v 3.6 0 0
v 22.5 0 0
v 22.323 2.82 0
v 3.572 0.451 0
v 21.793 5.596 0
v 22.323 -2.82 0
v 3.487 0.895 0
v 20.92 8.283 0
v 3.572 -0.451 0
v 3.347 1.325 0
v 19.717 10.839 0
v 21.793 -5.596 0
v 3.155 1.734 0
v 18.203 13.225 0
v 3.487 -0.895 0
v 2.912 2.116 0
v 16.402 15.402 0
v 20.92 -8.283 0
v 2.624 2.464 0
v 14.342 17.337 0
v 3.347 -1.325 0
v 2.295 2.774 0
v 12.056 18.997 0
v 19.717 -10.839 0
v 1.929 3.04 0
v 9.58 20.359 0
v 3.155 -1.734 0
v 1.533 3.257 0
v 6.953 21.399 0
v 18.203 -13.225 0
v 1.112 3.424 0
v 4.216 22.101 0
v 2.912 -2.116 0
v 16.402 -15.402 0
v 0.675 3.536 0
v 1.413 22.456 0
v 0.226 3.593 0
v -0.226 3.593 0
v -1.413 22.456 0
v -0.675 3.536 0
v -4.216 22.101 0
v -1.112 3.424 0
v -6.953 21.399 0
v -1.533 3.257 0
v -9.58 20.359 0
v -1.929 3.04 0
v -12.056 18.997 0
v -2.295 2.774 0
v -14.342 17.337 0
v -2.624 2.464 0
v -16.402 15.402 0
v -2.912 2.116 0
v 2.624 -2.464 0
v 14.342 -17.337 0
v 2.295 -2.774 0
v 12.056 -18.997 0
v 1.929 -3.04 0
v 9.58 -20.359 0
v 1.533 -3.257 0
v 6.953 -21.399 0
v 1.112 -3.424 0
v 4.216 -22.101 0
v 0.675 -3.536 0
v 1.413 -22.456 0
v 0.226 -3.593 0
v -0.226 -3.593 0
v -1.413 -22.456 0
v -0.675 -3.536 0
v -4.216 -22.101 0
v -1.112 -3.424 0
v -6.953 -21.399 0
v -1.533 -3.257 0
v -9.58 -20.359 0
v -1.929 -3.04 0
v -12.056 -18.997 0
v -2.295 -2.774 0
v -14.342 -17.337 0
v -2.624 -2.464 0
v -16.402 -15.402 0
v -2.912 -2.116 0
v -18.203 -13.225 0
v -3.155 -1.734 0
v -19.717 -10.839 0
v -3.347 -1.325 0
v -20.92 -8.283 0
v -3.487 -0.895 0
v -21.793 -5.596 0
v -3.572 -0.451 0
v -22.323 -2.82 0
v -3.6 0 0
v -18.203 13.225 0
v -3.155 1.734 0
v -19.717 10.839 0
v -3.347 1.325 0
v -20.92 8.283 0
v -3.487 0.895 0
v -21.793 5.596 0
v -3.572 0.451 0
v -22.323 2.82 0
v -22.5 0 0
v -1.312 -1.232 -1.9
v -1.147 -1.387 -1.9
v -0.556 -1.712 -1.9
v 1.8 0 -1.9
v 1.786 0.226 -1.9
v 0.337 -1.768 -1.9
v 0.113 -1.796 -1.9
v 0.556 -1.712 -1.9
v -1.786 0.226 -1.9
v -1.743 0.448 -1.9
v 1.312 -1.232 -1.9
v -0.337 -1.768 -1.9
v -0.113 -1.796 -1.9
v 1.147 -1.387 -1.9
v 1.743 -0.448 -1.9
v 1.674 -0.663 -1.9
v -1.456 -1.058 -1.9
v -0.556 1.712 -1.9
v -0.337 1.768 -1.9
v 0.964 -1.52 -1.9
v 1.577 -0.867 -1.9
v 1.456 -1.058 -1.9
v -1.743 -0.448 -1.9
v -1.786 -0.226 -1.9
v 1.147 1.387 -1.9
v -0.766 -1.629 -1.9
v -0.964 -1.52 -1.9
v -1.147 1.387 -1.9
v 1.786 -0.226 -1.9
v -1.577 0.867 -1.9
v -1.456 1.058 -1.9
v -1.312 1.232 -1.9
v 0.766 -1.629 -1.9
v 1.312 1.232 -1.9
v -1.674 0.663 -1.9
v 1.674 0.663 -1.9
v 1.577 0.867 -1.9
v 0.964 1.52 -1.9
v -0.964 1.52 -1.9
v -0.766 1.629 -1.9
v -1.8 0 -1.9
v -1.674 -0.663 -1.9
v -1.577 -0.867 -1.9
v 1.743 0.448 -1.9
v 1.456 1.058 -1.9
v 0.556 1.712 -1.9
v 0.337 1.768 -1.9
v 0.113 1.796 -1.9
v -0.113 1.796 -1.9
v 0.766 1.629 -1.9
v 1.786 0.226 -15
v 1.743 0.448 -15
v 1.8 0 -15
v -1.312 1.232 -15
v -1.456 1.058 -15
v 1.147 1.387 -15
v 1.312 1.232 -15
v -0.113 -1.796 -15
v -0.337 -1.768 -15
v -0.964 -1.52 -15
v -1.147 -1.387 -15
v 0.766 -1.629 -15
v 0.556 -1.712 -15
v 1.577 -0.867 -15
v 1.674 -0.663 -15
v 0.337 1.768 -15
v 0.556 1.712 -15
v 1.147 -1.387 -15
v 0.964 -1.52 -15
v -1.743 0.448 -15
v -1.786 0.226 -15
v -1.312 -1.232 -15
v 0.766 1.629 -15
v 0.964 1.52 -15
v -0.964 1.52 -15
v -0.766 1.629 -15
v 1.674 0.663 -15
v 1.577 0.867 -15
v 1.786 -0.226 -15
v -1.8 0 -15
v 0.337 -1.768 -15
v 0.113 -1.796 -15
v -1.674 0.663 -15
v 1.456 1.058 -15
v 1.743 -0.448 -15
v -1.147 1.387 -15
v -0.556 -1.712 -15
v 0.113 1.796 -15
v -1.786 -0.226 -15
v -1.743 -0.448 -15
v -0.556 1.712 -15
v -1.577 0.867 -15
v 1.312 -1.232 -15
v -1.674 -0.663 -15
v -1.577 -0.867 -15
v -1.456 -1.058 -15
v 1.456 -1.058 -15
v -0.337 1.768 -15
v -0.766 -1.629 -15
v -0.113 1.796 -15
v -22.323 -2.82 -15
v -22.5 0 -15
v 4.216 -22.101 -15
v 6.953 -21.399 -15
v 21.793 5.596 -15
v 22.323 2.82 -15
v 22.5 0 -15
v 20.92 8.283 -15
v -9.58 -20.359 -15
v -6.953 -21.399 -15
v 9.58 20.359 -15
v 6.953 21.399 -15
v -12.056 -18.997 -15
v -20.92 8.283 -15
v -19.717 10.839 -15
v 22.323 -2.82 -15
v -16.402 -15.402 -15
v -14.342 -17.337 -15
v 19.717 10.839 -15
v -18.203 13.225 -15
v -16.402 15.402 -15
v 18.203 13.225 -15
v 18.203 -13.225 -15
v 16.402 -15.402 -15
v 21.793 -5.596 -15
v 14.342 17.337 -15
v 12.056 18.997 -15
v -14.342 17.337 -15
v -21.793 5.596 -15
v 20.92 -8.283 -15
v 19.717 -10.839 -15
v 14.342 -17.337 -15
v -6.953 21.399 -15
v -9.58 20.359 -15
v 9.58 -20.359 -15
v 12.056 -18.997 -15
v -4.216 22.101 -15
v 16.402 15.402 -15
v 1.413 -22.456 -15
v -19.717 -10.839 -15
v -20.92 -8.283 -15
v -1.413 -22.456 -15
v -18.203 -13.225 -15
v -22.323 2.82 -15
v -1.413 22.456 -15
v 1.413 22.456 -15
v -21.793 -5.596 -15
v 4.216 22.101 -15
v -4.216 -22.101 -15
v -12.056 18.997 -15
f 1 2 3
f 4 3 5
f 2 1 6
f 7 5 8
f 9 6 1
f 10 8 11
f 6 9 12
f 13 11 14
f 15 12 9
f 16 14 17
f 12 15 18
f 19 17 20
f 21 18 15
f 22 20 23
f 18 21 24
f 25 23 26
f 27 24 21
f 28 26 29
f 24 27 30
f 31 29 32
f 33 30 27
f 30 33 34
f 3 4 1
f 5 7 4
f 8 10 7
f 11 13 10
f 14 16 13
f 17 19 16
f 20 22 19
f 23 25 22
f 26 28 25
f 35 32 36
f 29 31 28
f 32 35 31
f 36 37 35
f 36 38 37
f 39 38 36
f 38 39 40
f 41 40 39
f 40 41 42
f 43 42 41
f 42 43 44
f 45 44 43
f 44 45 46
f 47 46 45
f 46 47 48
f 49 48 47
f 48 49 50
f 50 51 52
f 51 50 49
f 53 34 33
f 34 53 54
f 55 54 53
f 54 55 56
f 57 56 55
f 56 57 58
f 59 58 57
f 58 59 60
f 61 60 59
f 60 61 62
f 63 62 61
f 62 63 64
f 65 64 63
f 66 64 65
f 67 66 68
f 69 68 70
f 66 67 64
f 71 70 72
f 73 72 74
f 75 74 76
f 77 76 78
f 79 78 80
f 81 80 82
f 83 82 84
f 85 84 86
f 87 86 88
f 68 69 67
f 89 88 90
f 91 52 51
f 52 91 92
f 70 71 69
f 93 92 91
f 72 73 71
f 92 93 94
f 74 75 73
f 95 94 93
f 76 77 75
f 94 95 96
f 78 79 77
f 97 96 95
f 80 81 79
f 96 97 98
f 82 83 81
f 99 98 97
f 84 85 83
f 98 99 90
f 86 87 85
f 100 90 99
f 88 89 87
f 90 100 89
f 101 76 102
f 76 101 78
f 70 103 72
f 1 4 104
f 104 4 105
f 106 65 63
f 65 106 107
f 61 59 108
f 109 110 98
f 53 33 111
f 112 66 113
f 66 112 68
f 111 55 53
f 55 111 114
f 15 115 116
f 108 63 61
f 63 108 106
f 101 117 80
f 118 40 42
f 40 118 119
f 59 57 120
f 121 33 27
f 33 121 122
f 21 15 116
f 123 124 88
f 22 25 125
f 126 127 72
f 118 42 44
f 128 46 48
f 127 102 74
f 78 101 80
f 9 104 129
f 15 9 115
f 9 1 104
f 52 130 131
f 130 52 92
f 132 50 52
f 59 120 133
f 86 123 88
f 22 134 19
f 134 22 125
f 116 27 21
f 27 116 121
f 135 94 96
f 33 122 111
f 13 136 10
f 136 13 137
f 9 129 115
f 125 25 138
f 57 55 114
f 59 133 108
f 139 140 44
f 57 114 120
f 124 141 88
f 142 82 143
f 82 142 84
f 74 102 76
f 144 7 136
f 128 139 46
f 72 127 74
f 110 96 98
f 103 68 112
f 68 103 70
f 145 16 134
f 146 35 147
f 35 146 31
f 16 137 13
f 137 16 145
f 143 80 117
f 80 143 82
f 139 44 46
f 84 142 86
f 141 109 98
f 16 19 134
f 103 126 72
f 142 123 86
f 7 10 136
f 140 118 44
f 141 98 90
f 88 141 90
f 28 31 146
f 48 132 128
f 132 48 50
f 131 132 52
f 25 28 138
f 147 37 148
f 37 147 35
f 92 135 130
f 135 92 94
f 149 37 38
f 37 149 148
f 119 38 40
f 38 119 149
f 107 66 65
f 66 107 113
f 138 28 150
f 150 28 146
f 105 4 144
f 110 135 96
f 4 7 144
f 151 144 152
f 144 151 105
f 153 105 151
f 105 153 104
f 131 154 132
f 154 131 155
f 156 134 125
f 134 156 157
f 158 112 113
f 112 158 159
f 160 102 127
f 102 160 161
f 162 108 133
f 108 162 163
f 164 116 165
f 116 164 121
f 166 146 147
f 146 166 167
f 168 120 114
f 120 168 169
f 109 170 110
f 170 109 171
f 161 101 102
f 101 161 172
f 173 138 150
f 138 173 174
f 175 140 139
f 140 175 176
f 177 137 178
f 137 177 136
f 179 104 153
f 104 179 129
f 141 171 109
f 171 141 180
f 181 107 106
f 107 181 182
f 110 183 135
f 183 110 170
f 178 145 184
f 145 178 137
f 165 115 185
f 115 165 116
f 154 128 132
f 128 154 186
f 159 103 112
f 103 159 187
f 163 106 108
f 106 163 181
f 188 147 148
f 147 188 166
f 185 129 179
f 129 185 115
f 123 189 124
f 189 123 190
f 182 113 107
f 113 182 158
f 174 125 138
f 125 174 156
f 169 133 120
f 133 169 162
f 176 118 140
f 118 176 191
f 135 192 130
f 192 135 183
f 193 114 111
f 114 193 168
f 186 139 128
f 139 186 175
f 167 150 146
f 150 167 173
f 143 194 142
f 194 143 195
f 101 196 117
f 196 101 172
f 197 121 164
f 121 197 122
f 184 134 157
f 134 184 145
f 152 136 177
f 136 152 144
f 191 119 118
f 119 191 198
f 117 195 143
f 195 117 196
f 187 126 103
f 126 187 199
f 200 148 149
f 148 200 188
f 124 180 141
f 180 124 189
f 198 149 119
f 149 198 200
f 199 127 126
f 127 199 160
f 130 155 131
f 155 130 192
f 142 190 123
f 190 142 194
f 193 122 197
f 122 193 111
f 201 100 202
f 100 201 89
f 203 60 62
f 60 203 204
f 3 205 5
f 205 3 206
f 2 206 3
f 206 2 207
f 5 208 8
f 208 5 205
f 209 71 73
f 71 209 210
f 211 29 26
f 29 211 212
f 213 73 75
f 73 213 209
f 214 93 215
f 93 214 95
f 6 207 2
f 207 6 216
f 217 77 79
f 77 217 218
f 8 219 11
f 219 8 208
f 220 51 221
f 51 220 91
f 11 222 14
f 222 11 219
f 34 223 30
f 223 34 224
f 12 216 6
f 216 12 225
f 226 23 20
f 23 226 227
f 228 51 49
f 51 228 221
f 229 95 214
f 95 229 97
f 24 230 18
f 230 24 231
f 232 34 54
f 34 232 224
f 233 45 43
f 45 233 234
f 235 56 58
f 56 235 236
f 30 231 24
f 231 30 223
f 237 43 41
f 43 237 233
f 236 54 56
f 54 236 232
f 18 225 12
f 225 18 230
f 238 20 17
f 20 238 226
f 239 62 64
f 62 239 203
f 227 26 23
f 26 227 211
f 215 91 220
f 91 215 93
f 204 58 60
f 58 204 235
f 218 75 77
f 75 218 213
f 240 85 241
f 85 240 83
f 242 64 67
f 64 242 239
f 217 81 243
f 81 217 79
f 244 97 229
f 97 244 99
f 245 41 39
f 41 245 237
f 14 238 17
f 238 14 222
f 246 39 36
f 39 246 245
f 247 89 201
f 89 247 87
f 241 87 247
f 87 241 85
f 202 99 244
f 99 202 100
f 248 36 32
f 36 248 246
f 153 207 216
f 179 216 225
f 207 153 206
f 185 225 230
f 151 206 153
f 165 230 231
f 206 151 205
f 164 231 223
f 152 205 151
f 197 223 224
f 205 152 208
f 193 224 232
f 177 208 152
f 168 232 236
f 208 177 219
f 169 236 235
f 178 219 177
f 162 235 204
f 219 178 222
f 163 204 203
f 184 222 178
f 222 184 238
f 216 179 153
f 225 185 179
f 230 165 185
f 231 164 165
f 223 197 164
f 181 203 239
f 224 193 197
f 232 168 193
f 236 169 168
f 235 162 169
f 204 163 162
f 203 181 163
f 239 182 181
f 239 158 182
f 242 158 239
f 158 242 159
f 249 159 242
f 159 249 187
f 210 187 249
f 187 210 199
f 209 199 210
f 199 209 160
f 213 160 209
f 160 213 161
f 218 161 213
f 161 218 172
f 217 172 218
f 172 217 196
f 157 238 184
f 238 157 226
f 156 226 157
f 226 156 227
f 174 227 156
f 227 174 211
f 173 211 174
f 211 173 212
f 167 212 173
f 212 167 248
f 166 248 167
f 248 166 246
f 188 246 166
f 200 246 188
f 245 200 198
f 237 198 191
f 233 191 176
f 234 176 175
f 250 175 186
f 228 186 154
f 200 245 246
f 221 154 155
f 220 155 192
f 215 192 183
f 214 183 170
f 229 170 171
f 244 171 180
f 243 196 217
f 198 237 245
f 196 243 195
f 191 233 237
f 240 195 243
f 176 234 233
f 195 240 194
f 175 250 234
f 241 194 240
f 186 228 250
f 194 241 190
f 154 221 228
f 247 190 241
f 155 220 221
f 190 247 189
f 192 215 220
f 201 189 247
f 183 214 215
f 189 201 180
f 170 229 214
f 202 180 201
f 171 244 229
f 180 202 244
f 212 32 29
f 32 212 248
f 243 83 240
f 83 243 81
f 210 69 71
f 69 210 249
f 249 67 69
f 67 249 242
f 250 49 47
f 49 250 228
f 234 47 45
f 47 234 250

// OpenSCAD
$fn = 50;


difference() {
	union() {
		translate(v = [0, 0, -15.0000000000]) {
			cylinder(h = 15, r = 22.5000000000);
		}
	}
	union() {
		translate(v = [0, 0, 0]) {
			rotate(a = [0, 0, 0]) {
				difference() {
					union() {
						translate(v = [0, 0, -18.0000000000]) {
							cylinder(h = 18, r = 1.5000000000);
						}
						translate(v = [0, 0, -1.9000000000]) {
							cylinder(h = 1.9000000000, r1 = 1.8000000000, r2 = 3.6000000000);
						}
						translate(v = [0, 0, -18.0000000000]) {
							cylinder(h = 18, r = 1.8000000000);
						}
						translate(v = [0, 0, -18.0000000000]) {
							cylinder(h = 18, r = 1.5000000000);
						}
					}
					union();
				}
			}
		}
	}
}
